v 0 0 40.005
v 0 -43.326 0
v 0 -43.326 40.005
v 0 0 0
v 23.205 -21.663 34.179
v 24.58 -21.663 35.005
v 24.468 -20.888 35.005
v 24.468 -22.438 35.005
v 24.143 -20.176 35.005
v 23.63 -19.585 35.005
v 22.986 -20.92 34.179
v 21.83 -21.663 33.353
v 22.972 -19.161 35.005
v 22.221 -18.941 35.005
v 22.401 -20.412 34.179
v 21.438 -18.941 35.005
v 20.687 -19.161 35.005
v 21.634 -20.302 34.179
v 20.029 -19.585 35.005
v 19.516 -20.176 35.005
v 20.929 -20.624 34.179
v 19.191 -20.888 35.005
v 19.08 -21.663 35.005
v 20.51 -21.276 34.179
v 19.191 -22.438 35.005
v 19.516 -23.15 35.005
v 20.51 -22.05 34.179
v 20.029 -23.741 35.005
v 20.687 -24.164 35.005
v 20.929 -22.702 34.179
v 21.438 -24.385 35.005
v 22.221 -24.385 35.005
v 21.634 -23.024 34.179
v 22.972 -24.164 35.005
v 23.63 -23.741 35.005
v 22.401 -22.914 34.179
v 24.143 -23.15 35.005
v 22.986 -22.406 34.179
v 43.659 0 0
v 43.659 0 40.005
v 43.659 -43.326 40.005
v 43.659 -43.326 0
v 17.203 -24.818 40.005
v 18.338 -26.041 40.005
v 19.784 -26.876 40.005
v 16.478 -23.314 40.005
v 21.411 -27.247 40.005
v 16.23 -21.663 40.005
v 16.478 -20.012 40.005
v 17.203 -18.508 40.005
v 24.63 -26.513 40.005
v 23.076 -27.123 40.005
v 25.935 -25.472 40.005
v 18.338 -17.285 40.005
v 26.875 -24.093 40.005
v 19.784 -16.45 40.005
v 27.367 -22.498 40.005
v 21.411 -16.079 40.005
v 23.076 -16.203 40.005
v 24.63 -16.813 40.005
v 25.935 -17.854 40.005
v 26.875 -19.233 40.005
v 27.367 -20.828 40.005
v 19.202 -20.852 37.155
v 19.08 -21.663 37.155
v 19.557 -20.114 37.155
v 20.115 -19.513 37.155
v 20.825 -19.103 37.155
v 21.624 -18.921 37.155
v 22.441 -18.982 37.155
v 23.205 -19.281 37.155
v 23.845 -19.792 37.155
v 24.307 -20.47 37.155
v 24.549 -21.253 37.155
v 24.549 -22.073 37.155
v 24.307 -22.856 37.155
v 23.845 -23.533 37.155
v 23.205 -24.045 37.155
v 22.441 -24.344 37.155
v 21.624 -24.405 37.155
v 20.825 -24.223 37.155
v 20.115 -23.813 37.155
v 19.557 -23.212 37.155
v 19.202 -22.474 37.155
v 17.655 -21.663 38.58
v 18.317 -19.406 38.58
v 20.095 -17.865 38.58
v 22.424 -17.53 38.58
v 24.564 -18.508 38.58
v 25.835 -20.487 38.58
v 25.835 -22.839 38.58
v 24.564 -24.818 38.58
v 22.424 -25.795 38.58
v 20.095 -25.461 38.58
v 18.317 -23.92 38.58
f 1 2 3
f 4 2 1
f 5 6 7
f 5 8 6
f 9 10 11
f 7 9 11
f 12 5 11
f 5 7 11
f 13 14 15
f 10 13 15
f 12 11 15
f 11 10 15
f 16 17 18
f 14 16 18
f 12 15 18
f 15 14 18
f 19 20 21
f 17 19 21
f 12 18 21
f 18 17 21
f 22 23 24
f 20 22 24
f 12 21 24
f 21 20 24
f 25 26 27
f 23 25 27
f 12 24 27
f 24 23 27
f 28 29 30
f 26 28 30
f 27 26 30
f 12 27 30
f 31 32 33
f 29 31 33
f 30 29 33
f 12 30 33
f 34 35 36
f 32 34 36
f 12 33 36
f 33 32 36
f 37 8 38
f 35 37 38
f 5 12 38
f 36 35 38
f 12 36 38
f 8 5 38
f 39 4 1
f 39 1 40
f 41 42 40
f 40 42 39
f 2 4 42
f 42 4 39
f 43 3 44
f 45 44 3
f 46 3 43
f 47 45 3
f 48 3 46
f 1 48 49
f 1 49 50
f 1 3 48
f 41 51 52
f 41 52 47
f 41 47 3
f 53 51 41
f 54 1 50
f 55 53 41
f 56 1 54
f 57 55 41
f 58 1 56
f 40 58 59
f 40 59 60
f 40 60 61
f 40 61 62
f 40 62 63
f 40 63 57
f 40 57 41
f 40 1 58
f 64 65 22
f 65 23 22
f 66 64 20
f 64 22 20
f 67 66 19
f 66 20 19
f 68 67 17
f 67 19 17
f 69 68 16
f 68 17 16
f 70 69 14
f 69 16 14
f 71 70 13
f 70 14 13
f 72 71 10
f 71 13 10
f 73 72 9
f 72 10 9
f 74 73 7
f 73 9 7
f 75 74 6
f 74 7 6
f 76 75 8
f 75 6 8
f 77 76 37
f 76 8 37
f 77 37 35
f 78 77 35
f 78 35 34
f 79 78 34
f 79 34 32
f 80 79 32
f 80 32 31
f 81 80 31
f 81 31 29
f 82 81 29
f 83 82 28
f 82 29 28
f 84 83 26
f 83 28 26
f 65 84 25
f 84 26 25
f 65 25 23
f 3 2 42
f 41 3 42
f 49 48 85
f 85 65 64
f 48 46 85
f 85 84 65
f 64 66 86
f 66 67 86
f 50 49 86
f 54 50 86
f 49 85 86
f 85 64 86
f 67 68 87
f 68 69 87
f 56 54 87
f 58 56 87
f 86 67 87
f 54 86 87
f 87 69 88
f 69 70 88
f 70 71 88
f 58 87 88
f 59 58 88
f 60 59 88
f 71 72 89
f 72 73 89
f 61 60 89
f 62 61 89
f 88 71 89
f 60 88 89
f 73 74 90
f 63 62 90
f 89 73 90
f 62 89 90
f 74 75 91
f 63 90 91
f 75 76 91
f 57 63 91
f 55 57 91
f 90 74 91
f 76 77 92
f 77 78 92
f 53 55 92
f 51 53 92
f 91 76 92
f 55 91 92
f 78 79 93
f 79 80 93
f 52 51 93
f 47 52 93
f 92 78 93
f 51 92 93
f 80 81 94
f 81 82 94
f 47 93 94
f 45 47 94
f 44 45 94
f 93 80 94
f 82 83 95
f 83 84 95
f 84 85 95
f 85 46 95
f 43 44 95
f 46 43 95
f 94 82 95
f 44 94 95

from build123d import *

# Parameters (mm, degrees)
F0_W           = 43.6590723693
F0_H           = 43.3258935809
F1_DEPTH       = 40.005
F3_D           = 5.5
F3_DEPTH       = 5
F3_CSINK_D     = 11.2
F3_CSINK_ANGLE = 90
F3_TIP         = 1.6523667023


with BuildPart() as f1:
    # F0 (on Top) → F1 (new body)
    with BuildSketch(Plane.XY):
        with Locations((21.8295361847, -21.6629467905)):
            Rectangle(F0_W, F0_H)
    extrude(amount=F1_DEPTH)

    # F3
    with Locations(Plane.XY.offset(40.005)):
        with Locations((21.8295361847, -21.6629467905)):
            CounterSinkHole(F3_D / 2, F3_CSINK_D / 2, depth=F3_DEPTH, counter_sink_angle=F3_CSINK_ANGLE)
            with Locations((0, 0, -(F3_DEPTH + F3_TIP / 2))):  # 118° drill point
                Cone(0, F3_D / 2, F3_TIP, mode=Mode.SUBTRACT)


solid = f1.part
